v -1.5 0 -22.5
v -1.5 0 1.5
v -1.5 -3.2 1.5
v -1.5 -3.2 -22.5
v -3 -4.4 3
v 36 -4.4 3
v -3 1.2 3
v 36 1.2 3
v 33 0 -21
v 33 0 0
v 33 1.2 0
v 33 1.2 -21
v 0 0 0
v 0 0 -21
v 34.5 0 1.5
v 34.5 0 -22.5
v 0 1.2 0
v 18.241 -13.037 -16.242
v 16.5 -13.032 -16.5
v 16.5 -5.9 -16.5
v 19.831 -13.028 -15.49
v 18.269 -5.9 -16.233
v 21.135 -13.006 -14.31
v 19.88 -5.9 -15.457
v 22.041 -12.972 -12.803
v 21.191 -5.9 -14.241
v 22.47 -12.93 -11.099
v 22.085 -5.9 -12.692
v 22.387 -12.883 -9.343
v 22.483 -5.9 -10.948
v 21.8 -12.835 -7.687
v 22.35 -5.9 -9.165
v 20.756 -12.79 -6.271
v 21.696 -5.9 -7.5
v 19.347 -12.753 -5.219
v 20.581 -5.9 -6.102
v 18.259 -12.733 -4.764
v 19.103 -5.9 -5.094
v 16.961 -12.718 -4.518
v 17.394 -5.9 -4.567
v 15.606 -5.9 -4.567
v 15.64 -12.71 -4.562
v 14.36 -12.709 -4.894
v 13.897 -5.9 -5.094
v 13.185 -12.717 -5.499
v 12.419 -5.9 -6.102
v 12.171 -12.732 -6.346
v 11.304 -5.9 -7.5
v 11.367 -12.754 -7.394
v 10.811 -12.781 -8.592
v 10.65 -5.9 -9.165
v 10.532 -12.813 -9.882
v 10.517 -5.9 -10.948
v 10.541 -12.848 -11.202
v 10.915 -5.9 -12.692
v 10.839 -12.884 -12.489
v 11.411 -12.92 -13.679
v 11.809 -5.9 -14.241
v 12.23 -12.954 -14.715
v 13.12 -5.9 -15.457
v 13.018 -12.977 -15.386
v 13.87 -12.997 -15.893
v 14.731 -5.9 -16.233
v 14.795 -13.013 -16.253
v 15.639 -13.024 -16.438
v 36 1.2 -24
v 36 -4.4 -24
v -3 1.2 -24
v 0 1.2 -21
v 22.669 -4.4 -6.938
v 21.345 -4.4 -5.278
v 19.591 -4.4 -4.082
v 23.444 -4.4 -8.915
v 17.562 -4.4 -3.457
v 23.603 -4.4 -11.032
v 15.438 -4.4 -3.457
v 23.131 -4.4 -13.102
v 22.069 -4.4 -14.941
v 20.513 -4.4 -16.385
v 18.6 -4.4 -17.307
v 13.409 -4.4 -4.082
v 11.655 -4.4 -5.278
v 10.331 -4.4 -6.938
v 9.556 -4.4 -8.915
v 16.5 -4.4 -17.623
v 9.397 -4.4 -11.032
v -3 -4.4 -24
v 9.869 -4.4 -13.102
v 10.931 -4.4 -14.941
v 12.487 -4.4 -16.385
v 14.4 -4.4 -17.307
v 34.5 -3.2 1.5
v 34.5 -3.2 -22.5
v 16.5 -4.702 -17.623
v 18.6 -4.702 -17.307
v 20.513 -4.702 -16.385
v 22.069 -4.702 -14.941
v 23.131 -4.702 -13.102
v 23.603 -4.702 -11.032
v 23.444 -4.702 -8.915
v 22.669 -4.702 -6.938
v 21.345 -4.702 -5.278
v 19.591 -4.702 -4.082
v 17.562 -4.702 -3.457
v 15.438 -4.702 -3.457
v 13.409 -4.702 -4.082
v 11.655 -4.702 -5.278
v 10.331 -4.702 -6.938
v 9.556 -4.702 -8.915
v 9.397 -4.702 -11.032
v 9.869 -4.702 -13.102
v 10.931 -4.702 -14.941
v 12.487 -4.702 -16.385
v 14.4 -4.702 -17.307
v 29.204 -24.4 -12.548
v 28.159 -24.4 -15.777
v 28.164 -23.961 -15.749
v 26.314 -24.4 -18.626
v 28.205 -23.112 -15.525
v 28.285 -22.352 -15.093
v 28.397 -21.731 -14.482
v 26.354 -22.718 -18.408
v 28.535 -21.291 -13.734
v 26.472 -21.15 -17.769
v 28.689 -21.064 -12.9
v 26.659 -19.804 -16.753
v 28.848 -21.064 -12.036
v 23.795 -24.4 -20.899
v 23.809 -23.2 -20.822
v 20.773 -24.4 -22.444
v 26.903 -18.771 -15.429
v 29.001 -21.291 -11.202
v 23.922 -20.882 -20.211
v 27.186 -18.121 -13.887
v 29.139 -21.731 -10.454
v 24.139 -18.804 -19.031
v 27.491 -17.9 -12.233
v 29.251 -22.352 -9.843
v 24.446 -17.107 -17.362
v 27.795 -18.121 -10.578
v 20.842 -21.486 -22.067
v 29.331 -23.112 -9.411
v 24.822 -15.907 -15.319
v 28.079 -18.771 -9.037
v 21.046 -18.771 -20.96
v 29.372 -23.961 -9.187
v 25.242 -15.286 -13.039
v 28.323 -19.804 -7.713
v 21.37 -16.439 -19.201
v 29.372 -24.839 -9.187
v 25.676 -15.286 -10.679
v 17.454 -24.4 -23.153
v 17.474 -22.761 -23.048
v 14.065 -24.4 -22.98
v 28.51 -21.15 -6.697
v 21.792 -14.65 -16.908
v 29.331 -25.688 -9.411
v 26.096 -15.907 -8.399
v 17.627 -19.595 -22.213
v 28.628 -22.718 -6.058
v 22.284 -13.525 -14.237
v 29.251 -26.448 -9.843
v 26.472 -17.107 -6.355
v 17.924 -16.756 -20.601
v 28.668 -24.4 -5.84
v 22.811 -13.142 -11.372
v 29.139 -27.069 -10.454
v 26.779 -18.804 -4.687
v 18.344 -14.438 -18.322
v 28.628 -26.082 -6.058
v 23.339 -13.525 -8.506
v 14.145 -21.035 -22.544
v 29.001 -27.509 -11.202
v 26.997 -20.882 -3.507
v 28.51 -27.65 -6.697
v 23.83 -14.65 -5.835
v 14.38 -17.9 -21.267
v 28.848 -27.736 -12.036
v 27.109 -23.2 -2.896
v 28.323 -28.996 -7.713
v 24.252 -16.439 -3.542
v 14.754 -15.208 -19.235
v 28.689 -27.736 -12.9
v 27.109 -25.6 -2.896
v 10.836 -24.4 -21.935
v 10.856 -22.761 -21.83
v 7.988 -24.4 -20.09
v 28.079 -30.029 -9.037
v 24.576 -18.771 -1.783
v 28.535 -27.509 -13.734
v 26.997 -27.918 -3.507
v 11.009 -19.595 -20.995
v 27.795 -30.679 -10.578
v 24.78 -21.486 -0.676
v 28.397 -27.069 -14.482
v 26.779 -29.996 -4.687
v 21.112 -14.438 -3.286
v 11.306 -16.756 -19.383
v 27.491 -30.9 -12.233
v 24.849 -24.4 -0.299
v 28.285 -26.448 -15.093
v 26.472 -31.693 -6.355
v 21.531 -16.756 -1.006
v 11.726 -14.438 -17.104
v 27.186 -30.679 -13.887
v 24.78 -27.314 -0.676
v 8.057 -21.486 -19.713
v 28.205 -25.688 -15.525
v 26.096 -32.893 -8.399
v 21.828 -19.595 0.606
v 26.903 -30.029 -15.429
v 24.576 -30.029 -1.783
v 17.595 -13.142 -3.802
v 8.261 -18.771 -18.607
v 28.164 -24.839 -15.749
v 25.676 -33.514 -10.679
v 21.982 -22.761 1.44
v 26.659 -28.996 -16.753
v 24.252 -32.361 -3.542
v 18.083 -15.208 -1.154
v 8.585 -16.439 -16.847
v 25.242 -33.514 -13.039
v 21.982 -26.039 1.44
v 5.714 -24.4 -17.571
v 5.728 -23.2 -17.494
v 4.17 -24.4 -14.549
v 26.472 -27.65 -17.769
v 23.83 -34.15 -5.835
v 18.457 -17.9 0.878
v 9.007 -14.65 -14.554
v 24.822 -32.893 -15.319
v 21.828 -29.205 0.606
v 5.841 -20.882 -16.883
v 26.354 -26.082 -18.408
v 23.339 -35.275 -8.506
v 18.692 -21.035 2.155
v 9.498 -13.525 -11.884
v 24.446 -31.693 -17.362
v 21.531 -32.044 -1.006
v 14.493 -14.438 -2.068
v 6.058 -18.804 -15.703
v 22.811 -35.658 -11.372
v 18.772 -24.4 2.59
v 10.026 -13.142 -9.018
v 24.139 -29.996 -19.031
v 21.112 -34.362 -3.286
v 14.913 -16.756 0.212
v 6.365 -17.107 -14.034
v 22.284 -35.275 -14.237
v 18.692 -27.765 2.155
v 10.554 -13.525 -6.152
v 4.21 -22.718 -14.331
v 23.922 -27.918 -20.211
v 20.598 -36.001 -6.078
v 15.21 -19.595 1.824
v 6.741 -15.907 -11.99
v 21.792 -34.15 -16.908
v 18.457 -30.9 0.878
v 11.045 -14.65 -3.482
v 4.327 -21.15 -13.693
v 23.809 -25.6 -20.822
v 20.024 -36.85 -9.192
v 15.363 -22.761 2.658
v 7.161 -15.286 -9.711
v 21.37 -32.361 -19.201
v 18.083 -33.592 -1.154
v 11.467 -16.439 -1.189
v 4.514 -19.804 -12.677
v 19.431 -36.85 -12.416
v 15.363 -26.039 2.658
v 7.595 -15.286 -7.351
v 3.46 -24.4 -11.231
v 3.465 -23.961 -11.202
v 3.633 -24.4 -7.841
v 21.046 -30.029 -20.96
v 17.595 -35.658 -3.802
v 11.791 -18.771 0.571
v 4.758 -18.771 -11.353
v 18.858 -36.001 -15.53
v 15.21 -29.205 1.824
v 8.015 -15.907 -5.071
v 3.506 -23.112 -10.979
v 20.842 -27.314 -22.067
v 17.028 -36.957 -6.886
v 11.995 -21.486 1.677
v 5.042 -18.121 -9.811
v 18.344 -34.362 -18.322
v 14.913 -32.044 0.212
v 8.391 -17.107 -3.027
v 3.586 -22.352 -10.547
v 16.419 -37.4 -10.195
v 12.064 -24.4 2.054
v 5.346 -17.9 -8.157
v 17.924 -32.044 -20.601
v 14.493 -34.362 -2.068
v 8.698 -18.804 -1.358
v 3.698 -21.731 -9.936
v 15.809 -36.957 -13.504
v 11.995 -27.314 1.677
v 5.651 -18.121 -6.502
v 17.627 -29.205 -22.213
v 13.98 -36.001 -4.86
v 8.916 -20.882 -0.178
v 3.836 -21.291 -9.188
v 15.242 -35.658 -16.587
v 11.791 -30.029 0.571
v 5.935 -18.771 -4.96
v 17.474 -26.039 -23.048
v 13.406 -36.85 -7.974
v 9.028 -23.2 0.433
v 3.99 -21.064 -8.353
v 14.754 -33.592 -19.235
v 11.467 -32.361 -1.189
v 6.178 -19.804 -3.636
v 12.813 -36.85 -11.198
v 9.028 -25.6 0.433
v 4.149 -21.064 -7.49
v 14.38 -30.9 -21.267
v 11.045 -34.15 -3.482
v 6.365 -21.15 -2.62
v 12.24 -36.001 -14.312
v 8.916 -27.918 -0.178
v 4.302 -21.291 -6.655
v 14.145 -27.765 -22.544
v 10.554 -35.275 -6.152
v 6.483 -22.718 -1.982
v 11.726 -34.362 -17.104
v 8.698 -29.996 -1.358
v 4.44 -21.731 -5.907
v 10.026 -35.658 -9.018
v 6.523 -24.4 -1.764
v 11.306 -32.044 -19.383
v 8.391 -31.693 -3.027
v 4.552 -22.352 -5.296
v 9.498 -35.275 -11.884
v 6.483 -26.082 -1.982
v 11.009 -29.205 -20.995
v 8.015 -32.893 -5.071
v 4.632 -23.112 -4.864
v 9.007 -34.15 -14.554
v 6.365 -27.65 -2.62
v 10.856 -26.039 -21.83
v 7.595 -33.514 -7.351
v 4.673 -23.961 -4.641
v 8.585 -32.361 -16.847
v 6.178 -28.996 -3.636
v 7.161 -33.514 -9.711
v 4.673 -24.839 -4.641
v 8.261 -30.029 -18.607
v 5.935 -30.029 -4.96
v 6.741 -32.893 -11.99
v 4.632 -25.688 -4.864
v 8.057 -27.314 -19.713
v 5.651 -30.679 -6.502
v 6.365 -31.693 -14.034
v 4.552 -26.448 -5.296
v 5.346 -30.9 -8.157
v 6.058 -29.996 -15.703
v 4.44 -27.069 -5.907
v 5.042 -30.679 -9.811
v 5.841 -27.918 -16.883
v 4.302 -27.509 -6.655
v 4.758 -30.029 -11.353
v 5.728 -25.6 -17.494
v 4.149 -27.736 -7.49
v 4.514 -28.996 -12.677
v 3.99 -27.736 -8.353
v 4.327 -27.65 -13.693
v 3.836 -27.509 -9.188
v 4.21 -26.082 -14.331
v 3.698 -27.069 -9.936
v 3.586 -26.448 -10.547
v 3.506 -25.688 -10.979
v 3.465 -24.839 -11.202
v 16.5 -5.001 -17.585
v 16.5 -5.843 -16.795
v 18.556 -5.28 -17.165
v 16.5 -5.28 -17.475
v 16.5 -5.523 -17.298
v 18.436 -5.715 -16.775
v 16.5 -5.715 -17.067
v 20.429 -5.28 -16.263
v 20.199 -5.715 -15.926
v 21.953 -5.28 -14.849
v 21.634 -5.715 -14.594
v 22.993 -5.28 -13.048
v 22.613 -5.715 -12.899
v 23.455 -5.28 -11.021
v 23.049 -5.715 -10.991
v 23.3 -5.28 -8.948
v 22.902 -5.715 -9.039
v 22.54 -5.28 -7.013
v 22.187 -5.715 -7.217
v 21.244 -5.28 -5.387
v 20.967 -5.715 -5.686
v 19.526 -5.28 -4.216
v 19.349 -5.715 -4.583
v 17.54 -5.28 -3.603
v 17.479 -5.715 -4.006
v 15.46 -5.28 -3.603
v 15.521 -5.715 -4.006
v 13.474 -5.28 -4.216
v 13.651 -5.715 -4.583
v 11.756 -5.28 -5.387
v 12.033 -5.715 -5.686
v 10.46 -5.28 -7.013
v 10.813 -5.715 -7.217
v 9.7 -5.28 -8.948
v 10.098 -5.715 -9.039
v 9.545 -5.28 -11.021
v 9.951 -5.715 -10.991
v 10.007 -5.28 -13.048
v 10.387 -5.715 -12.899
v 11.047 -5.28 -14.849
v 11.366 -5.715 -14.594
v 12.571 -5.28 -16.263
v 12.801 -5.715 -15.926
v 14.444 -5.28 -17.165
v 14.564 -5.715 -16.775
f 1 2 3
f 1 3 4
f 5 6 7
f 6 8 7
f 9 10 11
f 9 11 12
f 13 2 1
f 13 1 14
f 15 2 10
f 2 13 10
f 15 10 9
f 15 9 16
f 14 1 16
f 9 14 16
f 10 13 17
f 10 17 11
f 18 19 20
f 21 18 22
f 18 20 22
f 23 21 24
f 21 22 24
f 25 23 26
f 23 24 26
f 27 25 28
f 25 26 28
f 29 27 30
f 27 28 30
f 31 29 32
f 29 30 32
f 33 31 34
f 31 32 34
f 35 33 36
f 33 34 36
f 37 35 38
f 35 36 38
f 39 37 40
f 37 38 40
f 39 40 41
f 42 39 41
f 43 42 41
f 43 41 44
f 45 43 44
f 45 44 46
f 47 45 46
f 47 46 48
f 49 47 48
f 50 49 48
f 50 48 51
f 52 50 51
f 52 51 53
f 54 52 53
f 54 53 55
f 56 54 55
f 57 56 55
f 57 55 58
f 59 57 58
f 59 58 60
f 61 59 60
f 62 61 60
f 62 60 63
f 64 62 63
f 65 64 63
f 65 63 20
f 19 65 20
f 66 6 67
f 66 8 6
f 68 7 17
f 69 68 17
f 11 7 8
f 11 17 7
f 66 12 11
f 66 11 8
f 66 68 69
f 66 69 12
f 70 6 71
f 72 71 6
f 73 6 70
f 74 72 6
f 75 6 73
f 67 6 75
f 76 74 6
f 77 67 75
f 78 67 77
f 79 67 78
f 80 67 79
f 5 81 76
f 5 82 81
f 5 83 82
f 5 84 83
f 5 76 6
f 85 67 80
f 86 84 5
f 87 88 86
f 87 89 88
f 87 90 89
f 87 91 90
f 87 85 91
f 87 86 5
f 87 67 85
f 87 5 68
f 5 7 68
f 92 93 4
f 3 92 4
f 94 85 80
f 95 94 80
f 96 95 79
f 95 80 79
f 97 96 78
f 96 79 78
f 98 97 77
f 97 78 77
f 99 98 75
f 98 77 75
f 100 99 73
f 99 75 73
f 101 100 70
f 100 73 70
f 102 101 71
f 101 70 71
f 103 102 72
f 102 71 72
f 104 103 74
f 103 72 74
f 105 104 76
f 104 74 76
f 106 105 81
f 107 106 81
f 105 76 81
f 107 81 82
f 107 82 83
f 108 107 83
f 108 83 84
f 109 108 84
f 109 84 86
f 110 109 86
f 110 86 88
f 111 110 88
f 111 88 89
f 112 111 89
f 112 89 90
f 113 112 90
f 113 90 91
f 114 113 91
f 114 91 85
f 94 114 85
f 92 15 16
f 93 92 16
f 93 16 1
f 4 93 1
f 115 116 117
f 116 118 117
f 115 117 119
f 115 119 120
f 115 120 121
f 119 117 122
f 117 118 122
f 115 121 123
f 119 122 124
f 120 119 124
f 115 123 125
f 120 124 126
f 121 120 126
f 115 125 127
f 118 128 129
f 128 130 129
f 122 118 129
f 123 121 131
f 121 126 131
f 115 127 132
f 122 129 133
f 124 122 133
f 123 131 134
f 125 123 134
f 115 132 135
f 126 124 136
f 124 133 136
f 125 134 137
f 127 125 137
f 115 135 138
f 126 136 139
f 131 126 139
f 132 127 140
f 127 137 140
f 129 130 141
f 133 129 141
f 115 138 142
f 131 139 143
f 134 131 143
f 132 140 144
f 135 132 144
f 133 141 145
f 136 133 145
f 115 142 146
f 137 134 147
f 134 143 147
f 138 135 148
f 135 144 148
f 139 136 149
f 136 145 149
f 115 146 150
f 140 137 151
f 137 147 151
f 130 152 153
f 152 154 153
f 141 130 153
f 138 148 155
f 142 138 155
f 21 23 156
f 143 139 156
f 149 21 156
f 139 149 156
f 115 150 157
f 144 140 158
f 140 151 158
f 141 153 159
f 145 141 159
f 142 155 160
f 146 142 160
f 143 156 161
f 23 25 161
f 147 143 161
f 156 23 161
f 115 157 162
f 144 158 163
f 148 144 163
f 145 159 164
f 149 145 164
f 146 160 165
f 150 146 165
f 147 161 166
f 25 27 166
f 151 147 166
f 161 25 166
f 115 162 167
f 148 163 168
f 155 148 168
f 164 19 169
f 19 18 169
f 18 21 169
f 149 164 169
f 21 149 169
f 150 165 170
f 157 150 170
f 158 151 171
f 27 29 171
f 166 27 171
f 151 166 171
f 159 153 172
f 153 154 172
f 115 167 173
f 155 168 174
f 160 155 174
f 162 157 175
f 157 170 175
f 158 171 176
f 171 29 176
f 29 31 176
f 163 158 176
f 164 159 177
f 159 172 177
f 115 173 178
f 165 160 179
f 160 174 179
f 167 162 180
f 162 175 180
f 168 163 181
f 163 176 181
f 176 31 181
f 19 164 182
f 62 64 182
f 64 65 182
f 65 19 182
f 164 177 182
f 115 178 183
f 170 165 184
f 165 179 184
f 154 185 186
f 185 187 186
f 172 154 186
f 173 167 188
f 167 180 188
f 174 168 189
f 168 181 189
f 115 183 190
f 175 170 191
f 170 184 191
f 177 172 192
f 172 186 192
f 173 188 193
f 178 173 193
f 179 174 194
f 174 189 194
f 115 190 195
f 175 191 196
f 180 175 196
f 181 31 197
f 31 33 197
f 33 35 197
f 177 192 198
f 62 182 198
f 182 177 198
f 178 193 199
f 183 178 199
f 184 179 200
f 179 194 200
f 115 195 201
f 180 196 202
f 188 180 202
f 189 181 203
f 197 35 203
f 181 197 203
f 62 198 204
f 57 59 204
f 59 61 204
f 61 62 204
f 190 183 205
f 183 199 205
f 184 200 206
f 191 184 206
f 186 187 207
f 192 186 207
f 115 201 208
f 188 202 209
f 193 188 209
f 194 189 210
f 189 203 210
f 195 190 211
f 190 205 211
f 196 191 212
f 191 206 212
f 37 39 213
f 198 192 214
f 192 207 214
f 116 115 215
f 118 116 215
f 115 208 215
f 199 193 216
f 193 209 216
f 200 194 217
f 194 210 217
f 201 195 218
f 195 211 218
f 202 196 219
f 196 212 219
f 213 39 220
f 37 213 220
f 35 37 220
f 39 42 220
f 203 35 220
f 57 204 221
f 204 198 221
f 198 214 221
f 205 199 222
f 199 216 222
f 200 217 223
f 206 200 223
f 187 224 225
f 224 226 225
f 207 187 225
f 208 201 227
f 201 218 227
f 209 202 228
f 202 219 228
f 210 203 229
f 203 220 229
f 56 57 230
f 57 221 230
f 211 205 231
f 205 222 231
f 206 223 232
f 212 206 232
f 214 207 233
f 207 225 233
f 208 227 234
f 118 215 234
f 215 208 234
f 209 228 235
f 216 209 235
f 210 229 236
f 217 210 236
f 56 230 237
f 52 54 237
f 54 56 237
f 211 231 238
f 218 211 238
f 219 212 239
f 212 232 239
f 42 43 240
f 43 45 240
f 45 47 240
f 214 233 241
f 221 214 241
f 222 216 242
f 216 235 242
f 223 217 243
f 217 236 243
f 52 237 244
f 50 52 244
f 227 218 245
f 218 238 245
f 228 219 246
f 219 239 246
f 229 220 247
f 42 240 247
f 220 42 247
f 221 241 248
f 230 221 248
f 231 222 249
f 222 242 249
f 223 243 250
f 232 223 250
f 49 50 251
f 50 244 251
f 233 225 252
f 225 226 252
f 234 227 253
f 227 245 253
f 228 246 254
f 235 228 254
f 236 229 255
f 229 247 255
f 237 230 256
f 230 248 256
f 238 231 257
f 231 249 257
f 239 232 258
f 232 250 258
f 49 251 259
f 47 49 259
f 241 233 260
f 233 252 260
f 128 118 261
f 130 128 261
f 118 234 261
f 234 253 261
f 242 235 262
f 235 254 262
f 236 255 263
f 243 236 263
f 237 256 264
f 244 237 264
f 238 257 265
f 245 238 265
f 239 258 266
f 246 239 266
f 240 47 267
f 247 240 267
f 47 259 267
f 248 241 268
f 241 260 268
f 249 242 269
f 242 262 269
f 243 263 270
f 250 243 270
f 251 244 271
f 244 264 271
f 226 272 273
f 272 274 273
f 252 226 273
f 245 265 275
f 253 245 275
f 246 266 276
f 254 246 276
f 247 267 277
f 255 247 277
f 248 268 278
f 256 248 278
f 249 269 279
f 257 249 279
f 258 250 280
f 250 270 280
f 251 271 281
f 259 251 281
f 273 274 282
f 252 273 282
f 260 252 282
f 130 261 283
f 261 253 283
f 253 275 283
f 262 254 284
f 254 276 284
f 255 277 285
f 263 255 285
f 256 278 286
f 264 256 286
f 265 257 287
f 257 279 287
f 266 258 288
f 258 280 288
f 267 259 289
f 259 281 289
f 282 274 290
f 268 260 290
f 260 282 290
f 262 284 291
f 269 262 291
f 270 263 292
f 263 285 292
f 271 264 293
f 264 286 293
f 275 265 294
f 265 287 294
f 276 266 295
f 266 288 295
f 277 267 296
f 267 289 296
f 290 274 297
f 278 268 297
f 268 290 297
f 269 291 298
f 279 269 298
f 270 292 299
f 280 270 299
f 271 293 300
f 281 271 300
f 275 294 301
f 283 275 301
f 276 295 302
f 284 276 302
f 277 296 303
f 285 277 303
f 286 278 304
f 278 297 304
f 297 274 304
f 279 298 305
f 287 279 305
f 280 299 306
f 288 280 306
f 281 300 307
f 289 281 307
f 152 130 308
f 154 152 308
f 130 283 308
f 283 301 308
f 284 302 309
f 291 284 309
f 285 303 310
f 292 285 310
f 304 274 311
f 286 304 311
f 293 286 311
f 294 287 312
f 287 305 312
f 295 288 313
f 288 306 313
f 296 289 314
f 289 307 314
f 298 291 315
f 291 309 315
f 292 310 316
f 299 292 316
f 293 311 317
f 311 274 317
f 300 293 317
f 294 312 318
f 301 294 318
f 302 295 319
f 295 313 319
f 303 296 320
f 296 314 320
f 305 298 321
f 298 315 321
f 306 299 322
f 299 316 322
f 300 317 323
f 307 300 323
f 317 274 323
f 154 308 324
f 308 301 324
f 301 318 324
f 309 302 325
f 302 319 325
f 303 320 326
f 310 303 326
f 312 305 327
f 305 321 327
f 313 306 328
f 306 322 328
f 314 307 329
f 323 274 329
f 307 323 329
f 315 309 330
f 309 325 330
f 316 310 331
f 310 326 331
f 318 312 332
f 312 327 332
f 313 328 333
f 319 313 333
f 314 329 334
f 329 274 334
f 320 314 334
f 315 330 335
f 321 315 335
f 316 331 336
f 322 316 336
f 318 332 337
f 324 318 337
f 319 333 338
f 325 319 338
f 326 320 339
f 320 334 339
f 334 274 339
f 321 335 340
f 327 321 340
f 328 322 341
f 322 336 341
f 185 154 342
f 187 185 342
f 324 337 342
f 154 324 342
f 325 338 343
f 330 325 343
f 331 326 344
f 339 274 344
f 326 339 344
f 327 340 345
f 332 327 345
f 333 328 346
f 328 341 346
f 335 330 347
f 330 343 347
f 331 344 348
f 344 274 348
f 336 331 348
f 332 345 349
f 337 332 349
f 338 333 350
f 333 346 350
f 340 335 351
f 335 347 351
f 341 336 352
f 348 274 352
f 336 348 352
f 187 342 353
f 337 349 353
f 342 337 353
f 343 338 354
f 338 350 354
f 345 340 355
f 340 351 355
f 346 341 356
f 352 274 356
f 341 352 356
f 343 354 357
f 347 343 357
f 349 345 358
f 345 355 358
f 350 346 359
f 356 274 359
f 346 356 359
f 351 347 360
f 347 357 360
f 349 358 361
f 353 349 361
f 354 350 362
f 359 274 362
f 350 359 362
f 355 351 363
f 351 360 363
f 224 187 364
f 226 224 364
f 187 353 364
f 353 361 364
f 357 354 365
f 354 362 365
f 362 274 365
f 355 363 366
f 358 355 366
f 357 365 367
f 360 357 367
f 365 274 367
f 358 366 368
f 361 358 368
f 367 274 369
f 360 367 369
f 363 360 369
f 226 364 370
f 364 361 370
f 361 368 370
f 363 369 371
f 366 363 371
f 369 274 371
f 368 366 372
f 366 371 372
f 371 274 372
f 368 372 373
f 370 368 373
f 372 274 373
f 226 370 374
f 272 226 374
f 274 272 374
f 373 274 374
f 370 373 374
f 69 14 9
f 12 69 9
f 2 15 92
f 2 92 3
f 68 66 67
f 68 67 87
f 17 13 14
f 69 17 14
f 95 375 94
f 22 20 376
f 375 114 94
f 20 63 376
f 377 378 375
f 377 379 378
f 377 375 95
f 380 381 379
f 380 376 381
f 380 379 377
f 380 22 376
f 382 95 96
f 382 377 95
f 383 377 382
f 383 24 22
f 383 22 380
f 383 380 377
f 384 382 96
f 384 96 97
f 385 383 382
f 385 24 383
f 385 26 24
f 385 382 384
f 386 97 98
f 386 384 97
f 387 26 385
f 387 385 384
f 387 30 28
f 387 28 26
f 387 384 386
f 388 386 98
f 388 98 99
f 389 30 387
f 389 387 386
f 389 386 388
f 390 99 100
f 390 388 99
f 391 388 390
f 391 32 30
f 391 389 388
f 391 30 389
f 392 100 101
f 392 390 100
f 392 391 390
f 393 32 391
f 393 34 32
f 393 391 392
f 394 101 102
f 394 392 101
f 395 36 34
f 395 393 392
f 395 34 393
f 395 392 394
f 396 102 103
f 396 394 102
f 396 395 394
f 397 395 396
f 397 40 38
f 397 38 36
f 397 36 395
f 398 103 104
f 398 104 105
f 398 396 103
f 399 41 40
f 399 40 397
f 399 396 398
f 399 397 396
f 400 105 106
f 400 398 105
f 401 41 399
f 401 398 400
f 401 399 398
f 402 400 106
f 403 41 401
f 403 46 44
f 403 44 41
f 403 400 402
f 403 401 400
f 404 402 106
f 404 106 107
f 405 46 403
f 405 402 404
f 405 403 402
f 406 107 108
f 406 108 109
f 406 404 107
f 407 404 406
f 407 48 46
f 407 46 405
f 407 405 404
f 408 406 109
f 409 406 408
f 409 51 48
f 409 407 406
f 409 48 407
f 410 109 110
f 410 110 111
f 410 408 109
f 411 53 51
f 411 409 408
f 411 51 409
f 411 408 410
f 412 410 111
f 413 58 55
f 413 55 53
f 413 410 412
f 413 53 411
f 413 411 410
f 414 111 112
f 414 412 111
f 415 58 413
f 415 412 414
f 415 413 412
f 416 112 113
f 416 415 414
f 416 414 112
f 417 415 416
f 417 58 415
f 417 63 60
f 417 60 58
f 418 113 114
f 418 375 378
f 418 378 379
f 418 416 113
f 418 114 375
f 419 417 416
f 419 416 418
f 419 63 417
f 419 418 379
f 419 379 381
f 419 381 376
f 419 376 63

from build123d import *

# Parameters (mm, degrees)
ESQUISSE1_W        = 39
ESQUISSE1_H        = 27
ESQUISSE1_W_2      = 33
ESQUISSE1_H_2      = 21
BOSS_EXTRU_1_DEPTH = 1.2
ESQUISSE2_W        = 39
ESQUISSE2_H        = 27
ESQUISSE2_W_2      = 36
ESQUISSE2_H_2      = 24
BOSS_EXTRU_3_DEPTH = 3.2
ESQUISSE3_W        = 39
ESQUISSE3_H        = 27
BOSS_EXTRU_4_DEPTH = 1.2
ESQUISSE5_R        = 6
BOSS_EXTRU_6_DEPTH = 20
ESQUISSE6_R        = 7.123023745
BOSS_EXTRU_7_DEPTH = 1.5
CONG_1_R           = 1.2


with BuildPart() as part:
    # Esquisse1 → Boss.-Extru.1 (new body)
    with BuildSketch(Plane(origin=(0, 0, 0), x_dir=(1, 0, 0), z_dir=(0, 1, 0))):
        with Locations((16.5, 10.5)):
            Rectangle(ESQUISSE1_W, ESQUISSE1_H)
        with Locations((16.5, 10.5)):
            Rectangle(ESQUISSE1_W_2, ESQUISSE1_H_2, mode=Mode.SUBTRACT)
    extrude(amount=BOSS_EXTRU_1_DEPTH)

    # Esquisse2 → Boss.-Extru.3 (add)
    with BuildSketch(Plane(origin=(0, 0, 0), x_dir=(-1, 0, 0), z_dir=(0, -1, 0))):
        with Locations((-16.5, 10.5)):
            Rectangle(ESQUISSE2_W, ESQUISSE2_H)
        with Locations((-16.5, 10.5)):
            Rectangle(ESQUISSE2_W_2, ESQUISSE2_H_2, mode=Mode.SUBTRACT)
    extrude(amount=BOSS_EXTRU_3_DEPTH)

    # Esquisse3 → Boss.-Extru.4 (add)
    with BuildSketch(Plane(origin=(0, -3.2, 0), x_dir=(-1, 0, 0), z_dir=(0, -1, 0))):
        with Locations((-16.5, 10.5)):
            Rectangle(ESQUISSE3_W, ESQUISSE3_H)
    extrude(amount=BOSS_EXTRU_4_DEPTH)

    # Esquisse5 → Boss.-Extru.6 (add)
    with BuildSketch(Plane(origin=(0, -4.4, 0), x_dir=(-1, 0, 0), z_dir=(0, -1, 0))):
        with Locations(Location((-16.5, 10.5, 0), (0, 0, 90))):
            Circle(ESQUISSE5_R)
    extrude(amount=BOSS_EXTRU_6_DEPTH)

    # Esquisse6 → Boss.-Extru.7 (add)
    with BuildSketch(Plane.XZ.offset(4.4)):
        with Locations(Location((16.5, -10.5, 0), (0, 0, 270))):
            Circle(ESQUISSE6_R)
    extrude(amount=BOSS_EXTRU_7_DEPTH)

    # Congé1
    # the kernel refuses this fillet: 1.2 mm, written as the material it takes off along each edge
    with BuildSketch(Plane(origin=(16.5, -5.9, -10.5), x_dir=(0, 0, -1), z_dir=(-1, 0, 0))) as cong_1_piece_1:
        with BuildLine():
            CenterArc((5.923023745, -1.197528562), CONG_1_R, 0, 86.32212933)
            Line((6, 0), (6.001539525, 0.023950571))
            ThreePointArc((6.001539525, 0.023950571), (6.561511873, 0.024), (7.123023745, 0.024))
            Line((7.123023745, 0.024), (7.147023745, 0))
            Line((7.147023745, 0), (7.147023745, -1.197528562))
            Line((7.147023745, -1.197528562), (7.123023745, -1.197528562))
        make_face()
    revolve(axis=Axis((16.5, -5.9, -10.5), (0, -1, 0)), mode=Mode.SUBTRACT)

    # Esquisse7 → Révolution2 (revolve)
    with BuildSketch(Plane.XZ.offset(24.4)):
        with BuildLine():
            Line((3.633416396, -7.841279791), (29.203795551, -12.548265009))
            ThreePointArc((29.203795551, -12.548265009), (14.065113365, -22.979961978), (3.633416396, -7.841279791))
        make_face()
    revolve(axis=Axis((3.633416396, -24.4, -7.841279791), (0.9834761213686738, 0, -0.181037892988263)))


solid = part.part
